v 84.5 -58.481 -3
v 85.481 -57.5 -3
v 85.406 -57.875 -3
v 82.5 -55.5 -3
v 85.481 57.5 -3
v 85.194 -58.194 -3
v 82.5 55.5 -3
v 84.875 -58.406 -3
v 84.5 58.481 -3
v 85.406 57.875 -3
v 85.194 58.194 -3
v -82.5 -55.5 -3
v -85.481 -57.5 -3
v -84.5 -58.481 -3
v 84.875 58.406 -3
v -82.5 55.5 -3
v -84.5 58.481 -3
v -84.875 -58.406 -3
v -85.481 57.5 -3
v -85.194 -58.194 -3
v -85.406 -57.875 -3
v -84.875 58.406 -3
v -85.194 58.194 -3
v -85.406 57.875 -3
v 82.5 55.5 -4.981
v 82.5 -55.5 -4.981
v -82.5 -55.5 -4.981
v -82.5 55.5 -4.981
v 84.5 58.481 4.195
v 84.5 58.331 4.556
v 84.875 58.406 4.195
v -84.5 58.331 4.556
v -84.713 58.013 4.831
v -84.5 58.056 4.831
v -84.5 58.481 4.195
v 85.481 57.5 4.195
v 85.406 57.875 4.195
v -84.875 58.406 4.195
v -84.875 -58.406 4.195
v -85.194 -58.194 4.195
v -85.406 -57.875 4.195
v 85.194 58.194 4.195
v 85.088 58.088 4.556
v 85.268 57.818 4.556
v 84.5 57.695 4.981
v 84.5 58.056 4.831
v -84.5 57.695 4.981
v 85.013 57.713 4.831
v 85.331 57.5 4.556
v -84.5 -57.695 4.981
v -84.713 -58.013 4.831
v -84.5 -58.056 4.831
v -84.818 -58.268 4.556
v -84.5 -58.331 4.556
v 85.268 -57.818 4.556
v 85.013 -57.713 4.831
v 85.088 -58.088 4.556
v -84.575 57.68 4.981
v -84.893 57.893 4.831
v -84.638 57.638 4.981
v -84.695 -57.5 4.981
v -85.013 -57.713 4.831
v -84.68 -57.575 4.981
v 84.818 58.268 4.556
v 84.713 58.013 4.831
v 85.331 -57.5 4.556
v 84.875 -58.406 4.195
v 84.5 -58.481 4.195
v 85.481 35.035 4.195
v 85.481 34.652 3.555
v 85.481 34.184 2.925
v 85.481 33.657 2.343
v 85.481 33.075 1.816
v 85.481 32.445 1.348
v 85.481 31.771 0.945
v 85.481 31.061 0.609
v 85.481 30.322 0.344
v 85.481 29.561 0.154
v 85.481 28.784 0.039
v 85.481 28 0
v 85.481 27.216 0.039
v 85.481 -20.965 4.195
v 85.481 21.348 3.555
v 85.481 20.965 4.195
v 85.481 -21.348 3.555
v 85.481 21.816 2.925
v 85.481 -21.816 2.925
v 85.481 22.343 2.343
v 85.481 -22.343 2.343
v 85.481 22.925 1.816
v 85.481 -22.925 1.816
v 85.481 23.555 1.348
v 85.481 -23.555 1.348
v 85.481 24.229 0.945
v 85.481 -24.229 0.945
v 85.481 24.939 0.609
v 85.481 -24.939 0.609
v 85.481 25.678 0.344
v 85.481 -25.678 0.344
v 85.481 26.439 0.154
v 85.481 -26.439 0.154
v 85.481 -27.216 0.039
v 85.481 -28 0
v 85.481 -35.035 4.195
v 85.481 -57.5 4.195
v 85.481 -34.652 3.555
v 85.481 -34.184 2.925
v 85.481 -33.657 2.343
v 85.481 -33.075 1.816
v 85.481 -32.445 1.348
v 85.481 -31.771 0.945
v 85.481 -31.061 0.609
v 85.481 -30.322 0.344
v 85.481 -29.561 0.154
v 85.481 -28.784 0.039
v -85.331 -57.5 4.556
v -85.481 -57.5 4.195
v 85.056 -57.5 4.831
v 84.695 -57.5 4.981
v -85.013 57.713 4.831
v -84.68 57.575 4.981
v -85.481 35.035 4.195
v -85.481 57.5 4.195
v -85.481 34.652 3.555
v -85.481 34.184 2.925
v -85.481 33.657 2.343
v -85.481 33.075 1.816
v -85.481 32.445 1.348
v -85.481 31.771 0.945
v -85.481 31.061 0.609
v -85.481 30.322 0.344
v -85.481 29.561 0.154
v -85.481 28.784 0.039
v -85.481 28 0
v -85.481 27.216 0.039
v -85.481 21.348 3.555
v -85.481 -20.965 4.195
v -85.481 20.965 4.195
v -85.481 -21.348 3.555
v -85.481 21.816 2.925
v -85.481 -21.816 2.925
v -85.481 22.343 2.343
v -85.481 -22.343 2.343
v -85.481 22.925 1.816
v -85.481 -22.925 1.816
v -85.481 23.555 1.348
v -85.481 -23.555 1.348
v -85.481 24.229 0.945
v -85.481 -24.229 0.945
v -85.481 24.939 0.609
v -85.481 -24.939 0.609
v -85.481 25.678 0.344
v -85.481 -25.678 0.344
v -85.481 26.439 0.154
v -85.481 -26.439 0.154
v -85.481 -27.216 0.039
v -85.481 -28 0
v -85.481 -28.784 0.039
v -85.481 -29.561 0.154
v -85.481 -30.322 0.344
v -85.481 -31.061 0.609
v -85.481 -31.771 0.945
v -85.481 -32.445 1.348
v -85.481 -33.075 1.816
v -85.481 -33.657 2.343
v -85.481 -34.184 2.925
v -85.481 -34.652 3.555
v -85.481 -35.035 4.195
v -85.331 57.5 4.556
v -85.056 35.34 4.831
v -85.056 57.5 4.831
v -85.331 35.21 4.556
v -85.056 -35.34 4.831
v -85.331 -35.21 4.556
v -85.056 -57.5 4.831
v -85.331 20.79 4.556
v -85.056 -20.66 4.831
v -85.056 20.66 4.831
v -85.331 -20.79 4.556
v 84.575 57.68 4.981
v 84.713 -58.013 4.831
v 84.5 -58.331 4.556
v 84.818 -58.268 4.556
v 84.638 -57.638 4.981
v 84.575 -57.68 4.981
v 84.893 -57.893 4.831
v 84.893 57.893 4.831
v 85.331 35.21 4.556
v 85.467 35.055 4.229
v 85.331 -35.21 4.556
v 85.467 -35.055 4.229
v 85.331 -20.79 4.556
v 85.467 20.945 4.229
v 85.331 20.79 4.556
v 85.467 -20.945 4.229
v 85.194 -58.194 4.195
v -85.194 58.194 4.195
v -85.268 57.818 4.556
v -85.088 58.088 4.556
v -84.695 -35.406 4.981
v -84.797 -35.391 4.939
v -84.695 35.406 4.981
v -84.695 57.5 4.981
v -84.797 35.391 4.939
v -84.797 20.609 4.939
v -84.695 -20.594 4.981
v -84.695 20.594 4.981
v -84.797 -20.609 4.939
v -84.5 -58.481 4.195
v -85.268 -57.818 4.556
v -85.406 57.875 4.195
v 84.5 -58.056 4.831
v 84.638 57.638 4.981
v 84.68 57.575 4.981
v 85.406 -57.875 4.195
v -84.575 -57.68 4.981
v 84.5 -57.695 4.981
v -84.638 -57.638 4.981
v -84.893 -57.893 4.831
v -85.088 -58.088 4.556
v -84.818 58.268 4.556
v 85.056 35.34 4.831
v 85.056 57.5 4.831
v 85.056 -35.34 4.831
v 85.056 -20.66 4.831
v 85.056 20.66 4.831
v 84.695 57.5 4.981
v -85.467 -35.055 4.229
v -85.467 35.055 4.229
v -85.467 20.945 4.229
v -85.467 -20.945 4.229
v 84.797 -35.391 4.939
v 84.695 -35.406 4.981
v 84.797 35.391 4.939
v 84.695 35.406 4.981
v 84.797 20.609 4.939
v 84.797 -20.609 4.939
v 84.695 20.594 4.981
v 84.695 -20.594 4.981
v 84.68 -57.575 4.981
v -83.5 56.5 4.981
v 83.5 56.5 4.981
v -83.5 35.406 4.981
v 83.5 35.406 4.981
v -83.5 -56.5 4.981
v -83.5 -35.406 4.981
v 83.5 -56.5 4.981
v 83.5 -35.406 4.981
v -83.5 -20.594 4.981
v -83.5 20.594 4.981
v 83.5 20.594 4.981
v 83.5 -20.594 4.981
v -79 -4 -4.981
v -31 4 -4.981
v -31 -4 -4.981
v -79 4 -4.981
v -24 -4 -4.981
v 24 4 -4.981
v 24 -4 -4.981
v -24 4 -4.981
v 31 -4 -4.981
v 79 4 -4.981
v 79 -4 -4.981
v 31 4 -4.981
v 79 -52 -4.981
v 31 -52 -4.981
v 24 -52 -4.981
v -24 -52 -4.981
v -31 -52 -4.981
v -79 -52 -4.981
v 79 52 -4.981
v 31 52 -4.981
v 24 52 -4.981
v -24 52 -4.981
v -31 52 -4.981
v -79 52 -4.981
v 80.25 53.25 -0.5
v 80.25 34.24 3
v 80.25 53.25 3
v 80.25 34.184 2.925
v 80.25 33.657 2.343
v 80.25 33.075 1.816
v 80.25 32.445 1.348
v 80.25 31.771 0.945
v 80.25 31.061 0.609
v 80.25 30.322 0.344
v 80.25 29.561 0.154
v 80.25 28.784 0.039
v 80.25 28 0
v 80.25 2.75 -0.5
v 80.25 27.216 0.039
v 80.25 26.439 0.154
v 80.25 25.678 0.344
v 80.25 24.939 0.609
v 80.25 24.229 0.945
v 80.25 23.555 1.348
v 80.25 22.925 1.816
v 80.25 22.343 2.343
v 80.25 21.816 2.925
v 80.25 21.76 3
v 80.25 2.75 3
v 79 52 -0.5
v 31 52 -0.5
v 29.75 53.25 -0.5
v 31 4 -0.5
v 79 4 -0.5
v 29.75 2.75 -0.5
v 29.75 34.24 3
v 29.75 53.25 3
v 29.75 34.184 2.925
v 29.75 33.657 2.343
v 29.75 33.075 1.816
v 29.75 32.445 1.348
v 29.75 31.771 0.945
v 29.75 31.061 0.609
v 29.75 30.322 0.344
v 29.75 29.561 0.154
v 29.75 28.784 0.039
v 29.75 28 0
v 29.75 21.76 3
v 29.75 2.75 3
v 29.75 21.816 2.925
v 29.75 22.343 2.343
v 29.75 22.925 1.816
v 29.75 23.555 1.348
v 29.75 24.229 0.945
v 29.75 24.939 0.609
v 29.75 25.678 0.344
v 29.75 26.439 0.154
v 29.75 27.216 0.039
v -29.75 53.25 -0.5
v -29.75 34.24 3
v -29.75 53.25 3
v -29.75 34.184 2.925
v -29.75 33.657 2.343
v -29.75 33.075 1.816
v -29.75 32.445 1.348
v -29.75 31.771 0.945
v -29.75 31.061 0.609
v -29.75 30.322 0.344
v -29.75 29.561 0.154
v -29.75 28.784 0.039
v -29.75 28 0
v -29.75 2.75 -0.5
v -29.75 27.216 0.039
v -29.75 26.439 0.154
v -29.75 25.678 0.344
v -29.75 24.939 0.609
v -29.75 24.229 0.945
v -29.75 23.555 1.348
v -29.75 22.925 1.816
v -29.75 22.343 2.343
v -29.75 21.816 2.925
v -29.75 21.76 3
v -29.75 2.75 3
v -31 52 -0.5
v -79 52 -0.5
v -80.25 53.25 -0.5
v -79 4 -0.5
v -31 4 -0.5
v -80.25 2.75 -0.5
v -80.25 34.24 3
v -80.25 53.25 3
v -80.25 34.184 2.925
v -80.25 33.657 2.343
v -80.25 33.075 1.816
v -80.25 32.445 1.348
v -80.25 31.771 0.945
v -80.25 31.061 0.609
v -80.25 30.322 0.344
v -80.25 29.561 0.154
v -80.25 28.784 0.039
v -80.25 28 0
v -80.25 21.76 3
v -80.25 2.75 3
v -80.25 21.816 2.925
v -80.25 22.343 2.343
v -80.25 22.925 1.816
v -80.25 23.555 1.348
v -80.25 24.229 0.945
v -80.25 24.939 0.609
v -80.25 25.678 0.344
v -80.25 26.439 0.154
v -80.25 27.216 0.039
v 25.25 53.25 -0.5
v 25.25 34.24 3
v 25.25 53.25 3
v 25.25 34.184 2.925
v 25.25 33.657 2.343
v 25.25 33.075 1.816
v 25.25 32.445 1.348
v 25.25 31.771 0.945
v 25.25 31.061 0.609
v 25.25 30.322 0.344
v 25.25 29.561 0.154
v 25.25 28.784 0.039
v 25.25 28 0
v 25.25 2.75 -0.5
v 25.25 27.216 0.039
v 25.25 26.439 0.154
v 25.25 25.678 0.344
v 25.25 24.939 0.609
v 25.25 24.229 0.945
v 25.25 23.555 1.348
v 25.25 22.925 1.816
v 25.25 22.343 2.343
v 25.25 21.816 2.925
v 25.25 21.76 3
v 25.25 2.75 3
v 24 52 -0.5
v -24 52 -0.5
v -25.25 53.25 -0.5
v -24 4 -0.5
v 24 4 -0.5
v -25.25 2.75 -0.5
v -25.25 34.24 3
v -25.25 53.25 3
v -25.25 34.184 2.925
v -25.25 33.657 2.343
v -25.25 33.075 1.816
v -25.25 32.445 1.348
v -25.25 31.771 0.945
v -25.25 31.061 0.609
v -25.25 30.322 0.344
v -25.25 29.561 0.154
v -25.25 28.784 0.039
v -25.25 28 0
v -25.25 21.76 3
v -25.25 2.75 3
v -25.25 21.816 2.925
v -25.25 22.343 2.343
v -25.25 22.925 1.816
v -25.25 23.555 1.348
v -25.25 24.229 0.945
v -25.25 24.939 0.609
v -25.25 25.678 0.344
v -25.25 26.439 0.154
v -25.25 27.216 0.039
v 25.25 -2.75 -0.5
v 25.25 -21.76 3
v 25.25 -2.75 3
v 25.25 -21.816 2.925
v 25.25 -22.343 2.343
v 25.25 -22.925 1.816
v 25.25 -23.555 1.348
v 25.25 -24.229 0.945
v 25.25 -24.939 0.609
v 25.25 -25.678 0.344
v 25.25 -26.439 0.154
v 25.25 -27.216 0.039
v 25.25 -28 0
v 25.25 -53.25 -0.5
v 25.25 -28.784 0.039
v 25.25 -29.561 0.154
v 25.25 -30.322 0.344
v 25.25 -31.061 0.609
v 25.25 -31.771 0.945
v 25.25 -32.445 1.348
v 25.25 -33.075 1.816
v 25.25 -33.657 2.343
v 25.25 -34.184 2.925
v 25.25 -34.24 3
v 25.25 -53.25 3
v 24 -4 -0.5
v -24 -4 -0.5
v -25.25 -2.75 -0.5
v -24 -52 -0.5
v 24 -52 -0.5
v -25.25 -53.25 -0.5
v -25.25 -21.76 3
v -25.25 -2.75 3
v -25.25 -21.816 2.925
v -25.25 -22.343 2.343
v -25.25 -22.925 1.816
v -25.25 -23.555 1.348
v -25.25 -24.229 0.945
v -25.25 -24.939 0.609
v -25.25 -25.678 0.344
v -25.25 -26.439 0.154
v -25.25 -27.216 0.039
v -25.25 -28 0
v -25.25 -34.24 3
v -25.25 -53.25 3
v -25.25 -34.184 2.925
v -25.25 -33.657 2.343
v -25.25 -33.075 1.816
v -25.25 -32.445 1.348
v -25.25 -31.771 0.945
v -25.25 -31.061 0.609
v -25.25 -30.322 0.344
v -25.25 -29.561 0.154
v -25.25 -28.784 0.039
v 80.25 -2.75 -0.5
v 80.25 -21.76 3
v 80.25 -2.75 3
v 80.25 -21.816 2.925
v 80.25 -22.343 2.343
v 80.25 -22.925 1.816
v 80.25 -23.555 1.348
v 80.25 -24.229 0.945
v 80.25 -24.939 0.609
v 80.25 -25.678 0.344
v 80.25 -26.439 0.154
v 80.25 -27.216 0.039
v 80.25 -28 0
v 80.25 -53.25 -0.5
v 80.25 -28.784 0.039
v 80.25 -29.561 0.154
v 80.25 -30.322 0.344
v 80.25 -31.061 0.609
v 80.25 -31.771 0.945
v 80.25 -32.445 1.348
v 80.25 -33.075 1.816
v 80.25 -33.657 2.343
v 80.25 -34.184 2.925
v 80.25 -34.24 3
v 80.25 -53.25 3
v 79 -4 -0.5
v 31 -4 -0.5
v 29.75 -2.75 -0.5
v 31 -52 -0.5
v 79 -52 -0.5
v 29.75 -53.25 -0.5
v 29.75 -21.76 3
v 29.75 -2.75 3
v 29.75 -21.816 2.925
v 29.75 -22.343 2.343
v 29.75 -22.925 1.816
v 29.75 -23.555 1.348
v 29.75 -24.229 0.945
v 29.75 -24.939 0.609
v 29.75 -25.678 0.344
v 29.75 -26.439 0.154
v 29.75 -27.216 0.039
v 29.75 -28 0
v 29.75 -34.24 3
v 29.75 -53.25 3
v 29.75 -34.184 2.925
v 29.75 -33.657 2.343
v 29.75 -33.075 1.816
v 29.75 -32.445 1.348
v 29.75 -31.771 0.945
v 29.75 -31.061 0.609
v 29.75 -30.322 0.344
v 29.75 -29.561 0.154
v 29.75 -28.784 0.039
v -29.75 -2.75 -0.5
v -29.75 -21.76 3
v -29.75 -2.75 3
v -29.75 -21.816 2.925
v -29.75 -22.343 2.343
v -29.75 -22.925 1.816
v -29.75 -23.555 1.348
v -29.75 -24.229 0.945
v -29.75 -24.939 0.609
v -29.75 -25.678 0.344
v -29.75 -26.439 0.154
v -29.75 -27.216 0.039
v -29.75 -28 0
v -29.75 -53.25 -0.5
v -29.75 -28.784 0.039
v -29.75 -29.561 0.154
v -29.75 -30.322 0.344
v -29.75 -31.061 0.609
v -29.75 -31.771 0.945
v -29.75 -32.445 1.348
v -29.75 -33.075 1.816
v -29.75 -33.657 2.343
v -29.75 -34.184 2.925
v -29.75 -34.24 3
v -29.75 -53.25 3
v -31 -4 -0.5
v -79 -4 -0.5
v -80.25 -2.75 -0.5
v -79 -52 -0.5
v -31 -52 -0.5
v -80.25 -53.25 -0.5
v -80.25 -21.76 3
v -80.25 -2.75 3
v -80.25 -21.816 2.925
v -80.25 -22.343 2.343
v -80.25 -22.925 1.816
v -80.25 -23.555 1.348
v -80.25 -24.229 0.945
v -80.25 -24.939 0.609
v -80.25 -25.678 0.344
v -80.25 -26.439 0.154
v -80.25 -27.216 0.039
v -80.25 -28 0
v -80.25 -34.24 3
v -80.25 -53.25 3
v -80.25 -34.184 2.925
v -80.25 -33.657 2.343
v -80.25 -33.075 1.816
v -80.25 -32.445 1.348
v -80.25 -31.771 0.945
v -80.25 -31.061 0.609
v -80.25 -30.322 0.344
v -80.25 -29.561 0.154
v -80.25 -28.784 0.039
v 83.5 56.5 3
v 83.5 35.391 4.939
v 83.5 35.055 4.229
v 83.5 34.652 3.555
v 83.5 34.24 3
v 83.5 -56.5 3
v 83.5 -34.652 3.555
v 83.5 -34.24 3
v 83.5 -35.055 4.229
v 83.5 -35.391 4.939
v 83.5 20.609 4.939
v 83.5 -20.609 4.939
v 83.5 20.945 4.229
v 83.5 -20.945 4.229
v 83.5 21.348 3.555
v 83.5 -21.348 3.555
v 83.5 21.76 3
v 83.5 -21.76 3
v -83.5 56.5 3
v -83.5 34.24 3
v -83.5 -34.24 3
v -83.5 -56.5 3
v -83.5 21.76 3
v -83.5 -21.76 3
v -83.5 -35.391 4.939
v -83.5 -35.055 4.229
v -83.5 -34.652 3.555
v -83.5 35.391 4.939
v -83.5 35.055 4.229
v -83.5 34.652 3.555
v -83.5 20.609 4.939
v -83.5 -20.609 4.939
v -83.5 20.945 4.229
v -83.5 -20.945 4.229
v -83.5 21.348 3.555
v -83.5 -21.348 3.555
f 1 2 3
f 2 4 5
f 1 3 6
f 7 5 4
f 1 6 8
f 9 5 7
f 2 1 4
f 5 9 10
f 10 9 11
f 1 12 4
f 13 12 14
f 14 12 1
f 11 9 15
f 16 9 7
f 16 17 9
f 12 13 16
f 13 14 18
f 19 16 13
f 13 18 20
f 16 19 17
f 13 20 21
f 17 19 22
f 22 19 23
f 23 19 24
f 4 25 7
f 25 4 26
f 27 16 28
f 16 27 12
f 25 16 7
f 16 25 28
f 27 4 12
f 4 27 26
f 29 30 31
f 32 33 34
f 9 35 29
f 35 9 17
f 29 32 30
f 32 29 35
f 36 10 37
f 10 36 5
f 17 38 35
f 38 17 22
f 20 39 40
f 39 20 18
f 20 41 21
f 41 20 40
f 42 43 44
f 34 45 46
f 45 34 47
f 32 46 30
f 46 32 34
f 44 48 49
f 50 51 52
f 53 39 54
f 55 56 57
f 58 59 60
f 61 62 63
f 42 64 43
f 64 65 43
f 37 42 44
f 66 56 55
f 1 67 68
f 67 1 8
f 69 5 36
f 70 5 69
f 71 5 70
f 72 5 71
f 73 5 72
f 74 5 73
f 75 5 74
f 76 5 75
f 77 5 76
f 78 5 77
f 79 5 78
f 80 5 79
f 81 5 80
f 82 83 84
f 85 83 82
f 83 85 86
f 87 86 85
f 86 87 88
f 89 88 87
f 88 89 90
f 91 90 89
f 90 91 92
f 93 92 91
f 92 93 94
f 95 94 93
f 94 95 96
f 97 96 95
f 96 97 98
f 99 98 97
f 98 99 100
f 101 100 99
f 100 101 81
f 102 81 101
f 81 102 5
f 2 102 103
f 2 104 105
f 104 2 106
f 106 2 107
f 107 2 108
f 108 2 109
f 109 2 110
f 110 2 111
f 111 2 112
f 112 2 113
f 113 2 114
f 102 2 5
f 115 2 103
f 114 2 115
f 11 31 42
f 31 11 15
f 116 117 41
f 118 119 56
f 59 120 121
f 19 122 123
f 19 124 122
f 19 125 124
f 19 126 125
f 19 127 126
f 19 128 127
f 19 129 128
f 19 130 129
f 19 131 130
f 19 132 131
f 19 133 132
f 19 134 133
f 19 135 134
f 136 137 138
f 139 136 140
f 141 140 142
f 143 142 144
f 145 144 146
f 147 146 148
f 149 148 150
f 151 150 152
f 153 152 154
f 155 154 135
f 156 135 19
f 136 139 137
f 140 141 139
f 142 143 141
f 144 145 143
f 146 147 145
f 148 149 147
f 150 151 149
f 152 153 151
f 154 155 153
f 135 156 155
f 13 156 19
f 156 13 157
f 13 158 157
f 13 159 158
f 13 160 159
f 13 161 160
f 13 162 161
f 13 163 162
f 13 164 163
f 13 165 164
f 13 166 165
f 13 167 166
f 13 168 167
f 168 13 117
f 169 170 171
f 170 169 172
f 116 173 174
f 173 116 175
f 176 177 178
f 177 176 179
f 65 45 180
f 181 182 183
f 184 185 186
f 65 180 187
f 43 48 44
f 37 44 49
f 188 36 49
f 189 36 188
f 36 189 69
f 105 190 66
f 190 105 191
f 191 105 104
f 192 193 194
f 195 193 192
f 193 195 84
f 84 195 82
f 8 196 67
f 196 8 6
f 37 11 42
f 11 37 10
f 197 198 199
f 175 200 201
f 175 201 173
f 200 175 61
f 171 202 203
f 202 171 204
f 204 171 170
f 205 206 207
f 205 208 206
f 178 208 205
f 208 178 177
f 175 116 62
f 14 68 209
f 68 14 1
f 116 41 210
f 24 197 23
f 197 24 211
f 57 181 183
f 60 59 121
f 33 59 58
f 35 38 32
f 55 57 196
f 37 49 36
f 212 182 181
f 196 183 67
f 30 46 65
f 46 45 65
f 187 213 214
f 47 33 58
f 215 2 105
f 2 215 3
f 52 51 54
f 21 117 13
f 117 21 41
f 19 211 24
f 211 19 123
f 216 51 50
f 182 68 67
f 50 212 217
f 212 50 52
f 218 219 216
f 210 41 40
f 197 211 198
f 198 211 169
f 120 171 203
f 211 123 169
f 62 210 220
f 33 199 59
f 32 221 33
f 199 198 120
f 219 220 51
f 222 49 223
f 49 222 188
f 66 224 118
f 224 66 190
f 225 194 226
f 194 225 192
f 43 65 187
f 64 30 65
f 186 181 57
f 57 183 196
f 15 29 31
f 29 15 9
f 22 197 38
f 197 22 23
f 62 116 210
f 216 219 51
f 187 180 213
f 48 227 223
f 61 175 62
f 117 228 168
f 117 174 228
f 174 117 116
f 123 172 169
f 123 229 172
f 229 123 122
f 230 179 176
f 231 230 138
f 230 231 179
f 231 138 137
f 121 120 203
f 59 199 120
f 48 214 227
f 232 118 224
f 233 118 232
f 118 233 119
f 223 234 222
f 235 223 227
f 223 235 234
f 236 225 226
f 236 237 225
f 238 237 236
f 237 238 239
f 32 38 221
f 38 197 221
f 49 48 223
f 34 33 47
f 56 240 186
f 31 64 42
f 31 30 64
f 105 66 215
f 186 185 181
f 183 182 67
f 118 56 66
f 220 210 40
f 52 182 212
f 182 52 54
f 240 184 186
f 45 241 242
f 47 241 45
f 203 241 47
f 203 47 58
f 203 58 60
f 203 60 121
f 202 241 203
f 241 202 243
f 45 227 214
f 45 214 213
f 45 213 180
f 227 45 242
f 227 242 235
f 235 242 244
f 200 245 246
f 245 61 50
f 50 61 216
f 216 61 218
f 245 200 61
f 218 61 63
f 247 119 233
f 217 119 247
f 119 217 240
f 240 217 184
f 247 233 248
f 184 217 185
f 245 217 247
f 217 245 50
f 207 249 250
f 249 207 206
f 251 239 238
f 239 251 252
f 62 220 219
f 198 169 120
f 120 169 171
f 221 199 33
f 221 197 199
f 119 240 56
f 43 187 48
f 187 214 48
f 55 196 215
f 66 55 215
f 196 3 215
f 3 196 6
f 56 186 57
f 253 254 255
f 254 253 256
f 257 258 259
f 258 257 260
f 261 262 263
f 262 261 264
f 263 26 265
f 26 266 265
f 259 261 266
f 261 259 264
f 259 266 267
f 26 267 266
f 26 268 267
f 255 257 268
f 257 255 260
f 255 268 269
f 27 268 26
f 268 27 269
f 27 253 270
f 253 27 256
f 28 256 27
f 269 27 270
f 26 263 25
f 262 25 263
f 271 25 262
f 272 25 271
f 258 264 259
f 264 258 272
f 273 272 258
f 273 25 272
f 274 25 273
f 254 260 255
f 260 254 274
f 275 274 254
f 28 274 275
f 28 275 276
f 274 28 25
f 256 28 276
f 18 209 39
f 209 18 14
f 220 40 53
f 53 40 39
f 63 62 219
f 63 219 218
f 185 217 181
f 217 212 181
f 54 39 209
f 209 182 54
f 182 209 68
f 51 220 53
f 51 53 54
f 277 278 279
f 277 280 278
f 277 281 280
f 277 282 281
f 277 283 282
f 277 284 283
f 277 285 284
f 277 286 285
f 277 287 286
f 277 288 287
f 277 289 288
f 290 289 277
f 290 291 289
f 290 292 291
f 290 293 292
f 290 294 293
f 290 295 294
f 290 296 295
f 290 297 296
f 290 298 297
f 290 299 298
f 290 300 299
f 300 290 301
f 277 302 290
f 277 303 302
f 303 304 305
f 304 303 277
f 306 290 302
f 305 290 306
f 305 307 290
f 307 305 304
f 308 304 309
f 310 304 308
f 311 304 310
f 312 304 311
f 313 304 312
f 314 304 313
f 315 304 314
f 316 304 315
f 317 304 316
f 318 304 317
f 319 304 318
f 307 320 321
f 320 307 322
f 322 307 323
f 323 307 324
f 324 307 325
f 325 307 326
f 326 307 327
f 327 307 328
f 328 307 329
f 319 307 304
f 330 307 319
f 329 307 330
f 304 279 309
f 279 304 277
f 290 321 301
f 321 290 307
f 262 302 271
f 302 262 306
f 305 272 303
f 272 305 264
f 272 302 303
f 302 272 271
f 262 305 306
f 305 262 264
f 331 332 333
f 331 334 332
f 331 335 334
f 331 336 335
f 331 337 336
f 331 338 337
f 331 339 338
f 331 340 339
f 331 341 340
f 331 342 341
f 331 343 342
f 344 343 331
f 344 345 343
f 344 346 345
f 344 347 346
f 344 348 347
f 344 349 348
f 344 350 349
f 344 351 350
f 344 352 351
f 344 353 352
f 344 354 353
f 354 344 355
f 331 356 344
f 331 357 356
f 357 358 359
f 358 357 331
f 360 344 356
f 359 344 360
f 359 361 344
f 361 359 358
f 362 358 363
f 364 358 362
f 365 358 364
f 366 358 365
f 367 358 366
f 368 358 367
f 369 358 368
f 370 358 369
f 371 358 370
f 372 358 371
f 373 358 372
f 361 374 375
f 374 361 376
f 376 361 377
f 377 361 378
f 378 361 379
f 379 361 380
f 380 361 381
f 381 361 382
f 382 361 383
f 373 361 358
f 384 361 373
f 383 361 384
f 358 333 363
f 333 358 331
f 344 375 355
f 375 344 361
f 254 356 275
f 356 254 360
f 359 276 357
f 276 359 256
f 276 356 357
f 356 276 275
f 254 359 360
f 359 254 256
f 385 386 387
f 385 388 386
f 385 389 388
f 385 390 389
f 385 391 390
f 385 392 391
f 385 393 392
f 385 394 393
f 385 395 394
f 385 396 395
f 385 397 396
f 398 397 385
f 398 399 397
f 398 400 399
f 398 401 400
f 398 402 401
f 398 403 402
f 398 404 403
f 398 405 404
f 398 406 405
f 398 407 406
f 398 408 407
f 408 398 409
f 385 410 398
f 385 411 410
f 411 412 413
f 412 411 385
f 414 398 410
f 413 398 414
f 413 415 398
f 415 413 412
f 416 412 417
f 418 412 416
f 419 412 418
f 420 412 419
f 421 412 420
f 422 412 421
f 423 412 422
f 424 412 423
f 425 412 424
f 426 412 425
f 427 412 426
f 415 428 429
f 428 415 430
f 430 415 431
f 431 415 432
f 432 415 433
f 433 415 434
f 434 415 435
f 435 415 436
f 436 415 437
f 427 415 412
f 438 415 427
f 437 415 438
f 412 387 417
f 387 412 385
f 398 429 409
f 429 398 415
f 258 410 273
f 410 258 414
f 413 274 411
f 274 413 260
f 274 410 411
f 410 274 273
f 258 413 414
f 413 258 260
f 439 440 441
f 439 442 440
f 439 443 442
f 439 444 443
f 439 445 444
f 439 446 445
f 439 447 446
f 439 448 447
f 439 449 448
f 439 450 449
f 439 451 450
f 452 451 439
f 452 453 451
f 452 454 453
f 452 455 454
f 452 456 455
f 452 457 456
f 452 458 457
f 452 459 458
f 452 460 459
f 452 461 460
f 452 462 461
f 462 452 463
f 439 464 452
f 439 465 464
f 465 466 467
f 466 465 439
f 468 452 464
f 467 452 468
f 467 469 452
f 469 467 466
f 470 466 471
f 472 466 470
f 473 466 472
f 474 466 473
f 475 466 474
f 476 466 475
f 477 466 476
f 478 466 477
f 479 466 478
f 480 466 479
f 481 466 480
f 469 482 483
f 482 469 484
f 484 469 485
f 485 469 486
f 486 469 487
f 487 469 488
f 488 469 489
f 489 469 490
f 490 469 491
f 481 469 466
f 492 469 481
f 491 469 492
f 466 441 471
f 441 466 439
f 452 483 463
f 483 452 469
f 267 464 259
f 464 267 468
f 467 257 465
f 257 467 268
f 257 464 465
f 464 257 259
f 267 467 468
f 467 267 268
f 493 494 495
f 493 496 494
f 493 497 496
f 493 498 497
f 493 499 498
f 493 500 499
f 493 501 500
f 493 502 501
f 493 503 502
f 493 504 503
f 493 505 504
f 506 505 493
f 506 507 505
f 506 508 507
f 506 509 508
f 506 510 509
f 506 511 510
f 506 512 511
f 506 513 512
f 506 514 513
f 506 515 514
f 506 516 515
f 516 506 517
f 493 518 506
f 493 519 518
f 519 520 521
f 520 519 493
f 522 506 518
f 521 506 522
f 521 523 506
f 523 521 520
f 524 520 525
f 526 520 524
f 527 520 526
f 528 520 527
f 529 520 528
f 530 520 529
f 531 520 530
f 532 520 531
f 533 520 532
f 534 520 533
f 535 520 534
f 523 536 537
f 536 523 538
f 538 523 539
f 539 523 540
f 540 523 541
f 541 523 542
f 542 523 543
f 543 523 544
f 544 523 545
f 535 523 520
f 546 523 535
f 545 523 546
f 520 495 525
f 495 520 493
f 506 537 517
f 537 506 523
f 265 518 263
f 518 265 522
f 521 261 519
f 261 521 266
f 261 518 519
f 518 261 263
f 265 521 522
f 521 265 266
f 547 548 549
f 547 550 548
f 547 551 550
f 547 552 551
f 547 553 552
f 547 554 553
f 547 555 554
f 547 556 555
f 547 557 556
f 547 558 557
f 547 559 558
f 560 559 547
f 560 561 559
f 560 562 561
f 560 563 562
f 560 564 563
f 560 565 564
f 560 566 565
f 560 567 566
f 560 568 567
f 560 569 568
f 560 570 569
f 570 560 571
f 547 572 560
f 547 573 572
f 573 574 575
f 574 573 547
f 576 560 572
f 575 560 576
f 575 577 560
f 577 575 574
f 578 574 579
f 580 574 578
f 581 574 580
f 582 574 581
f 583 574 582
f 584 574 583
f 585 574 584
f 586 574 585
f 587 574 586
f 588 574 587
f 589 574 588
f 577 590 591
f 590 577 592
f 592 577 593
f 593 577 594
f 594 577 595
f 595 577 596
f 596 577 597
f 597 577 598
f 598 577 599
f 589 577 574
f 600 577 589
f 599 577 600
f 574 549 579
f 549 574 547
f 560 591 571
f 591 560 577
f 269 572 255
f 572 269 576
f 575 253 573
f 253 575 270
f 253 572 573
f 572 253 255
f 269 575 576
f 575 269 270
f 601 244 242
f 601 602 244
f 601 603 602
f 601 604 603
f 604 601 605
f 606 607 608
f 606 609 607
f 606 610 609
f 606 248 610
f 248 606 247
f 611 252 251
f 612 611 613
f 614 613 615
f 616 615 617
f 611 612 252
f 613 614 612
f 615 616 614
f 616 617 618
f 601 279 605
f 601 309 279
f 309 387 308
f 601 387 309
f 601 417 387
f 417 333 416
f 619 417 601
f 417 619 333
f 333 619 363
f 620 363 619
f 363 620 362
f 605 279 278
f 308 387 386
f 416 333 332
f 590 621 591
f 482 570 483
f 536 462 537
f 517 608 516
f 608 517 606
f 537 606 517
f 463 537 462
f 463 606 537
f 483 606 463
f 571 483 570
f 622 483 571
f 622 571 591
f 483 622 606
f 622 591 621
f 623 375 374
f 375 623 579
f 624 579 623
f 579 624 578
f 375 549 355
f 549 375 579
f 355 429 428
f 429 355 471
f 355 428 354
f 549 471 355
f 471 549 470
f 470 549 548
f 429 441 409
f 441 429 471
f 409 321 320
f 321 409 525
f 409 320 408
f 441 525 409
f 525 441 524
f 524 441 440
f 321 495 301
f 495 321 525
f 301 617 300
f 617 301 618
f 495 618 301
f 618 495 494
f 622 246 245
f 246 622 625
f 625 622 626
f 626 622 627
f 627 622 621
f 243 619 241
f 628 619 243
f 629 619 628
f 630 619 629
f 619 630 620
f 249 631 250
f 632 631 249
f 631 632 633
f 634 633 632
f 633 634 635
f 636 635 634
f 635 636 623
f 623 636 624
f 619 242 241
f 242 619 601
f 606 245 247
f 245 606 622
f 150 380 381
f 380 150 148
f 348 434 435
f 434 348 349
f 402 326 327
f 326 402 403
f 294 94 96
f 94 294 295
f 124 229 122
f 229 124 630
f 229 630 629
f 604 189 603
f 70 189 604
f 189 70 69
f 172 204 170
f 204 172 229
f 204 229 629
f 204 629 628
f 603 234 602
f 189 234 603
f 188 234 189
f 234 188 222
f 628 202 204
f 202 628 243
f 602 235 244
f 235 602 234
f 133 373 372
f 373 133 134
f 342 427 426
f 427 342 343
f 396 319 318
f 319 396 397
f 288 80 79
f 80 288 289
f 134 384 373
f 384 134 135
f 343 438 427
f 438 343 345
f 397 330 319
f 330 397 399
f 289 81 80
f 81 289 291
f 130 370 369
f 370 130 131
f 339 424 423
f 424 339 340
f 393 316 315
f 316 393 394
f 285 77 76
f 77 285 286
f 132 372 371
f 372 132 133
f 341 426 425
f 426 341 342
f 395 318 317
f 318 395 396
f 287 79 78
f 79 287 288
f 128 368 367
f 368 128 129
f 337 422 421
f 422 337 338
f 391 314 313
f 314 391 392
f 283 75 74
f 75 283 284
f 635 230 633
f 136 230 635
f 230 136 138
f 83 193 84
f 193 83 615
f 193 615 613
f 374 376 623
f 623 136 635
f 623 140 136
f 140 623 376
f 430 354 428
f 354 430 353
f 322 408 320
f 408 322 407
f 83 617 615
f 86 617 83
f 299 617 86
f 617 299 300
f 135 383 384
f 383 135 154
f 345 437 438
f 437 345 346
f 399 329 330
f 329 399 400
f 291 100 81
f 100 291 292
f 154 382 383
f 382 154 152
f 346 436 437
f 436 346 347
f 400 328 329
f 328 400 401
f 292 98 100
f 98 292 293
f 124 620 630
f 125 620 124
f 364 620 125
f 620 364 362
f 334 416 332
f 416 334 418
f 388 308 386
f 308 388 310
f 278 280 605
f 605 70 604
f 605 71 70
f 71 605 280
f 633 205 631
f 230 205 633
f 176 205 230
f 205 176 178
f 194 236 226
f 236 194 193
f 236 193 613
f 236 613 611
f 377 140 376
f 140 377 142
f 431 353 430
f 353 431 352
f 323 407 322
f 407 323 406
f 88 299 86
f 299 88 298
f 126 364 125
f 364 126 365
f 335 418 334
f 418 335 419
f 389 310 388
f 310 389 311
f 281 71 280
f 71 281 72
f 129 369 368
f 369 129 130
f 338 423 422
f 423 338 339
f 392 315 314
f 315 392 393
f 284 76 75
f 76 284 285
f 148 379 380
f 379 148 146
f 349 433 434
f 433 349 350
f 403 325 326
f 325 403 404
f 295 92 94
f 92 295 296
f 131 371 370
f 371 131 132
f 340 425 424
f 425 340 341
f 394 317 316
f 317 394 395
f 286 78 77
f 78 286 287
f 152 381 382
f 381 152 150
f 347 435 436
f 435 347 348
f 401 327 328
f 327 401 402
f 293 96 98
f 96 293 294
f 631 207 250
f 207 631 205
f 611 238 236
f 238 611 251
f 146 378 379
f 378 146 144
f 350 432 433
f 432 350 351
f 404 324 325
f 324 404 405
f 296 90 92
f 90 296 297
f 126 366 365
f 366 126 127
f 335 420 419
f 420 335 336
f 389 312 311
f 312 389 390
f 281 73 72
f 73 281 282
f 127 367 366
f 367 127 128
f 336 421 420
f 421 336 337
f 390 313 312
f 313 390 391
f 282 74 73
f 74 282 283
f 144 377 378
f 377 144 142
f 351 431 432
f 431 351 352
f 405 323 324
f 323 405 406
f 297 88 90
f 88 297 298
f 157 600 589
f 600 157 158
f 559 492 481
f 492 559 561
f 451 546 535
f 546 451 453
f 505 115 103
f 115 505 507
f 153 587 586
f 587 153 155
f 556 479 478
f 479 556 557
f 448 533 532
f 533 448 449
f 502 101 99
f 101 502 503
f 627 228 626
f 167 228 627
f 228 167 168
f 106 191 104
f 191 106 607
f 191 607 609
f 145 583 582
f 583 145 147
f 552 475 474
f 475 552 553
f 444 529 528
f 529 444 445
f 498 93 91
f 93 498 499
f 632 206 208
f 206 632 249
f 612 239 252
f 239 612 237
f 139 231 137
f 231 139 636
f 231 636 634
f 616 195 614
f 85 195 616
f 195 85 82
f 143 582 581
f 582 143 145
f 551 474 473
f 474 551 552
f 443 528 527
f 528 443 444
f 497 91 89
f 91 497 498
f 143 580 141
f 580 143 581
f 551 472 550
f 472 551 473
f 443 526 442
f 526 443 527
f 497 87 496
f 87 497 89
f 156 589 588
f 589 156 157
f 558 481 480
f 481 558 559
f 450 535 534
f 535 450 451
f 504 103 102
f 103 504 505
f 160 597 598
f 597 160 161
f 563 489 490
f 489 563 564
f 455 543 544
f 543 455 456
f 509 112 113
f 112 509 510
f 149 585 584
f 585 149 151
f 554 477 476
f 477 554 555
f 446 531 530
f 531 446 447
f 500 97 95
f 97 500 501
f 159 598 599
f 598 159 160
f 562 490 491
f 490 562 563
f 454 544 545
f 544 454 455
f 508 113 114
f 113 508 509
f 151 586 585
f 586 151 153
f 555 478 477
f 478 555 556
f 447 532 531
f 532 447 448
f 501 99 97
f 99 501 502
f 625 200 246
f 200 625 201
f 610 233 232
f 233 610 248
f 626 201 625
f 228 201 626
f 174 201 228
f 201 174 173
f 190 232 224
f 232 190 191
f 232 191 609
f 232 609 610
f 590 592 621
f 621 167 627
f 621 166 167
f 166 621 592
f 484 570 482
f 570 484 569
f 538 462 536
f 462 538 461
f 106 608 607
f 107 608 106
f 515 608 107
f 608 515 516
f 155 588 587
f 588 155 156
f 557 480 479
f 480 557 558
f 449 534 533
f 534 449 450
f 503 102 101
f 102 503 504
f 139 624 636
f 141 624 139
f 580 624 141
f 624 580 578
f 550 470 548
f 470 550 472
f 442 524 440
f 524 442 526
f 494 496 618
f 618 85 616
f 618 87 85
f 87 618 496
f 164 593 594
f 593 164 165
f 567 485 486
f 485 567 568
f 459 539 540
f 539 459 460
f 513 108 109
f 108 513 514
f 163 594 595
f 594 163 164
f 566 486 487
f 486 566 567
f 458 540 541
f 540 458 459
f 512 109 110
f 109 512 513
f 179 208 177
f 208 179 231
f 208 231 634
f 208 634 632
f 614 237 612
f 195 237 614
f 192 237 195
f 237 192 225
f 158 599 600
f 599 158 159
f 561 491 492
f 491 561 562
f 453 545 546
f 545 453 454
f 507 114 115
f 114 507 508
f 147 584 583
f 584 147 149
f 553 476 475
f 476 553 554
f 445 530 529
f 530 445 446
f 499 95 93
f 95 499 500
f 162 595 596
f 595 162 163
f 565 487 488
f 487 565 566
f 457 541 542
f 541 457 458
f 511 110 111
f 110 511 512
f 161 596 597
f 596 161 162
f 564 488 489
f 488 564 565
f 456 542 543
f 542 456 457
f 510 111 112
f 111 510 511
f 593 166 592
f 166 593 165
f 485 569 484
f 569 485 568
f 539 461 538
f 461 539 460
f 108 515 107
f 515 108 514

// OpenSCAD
// Base
module base_ppal() {
    // Partes a sumar
    difference(){
        minkowski(){
            sphere(1, $fn=16);
            cube ([169, 115, 8], center = true);
        }
        
    // Partes a restar (Hueco parte inferior, para calzar en otro tray)   
    difference() { 
        translate([0,0, -7 ]) cube ([200, 150, 8], center = true);
        translate([0,0, -7 ]) cube ([165, 111, 8], center = true);
        
    }
    }
}


// Cuerpo del micro
module micro() {
    // Cuerpo del micro
    translate([0,0, 7 ]) cube ([50.5, 50.5, 10], center = true);
    // Pines del micro
    translate([0,0,-1 ]) cube ([48.0, 48.0,  7], center = true); //achicado 1mm
}


//Tray
module tray() {
    difference() {
        union() {
            base_ppal();

        }
        // Partes a restar 
        union(){
            translate([ 55, 28,-2.5 ]) micro();
            translate([-55, 28,-2.5 ]) micro();     
            
            translate([  0, 28,-2.5 ]) micro();
            translate([  0,-28,-2.5 ]) micro(); 
     
            translate([ 55,-28,-2.5 ]) micro();
            translate([-55,-28,-2.5 ]) micro();  
            
            // Hueco parte superior, para calzar en otro tray   
            translate([0,0, 7 ]) cube ([167, 113, 8], center = true);

            // Huecos para los dedos, para poder retirar los micros mas facil
            rotate ([ 0, 90, 0]) translate ([-8, 28,0]) cylinder(200, 8,8, $fn=64, center=true);
            rotate ([ 0, 90, 0]) translate ([-8,-28,0]) cylinder(200, 8,8, $fn=64, center=true);            
        }
    }
}


 tray();
